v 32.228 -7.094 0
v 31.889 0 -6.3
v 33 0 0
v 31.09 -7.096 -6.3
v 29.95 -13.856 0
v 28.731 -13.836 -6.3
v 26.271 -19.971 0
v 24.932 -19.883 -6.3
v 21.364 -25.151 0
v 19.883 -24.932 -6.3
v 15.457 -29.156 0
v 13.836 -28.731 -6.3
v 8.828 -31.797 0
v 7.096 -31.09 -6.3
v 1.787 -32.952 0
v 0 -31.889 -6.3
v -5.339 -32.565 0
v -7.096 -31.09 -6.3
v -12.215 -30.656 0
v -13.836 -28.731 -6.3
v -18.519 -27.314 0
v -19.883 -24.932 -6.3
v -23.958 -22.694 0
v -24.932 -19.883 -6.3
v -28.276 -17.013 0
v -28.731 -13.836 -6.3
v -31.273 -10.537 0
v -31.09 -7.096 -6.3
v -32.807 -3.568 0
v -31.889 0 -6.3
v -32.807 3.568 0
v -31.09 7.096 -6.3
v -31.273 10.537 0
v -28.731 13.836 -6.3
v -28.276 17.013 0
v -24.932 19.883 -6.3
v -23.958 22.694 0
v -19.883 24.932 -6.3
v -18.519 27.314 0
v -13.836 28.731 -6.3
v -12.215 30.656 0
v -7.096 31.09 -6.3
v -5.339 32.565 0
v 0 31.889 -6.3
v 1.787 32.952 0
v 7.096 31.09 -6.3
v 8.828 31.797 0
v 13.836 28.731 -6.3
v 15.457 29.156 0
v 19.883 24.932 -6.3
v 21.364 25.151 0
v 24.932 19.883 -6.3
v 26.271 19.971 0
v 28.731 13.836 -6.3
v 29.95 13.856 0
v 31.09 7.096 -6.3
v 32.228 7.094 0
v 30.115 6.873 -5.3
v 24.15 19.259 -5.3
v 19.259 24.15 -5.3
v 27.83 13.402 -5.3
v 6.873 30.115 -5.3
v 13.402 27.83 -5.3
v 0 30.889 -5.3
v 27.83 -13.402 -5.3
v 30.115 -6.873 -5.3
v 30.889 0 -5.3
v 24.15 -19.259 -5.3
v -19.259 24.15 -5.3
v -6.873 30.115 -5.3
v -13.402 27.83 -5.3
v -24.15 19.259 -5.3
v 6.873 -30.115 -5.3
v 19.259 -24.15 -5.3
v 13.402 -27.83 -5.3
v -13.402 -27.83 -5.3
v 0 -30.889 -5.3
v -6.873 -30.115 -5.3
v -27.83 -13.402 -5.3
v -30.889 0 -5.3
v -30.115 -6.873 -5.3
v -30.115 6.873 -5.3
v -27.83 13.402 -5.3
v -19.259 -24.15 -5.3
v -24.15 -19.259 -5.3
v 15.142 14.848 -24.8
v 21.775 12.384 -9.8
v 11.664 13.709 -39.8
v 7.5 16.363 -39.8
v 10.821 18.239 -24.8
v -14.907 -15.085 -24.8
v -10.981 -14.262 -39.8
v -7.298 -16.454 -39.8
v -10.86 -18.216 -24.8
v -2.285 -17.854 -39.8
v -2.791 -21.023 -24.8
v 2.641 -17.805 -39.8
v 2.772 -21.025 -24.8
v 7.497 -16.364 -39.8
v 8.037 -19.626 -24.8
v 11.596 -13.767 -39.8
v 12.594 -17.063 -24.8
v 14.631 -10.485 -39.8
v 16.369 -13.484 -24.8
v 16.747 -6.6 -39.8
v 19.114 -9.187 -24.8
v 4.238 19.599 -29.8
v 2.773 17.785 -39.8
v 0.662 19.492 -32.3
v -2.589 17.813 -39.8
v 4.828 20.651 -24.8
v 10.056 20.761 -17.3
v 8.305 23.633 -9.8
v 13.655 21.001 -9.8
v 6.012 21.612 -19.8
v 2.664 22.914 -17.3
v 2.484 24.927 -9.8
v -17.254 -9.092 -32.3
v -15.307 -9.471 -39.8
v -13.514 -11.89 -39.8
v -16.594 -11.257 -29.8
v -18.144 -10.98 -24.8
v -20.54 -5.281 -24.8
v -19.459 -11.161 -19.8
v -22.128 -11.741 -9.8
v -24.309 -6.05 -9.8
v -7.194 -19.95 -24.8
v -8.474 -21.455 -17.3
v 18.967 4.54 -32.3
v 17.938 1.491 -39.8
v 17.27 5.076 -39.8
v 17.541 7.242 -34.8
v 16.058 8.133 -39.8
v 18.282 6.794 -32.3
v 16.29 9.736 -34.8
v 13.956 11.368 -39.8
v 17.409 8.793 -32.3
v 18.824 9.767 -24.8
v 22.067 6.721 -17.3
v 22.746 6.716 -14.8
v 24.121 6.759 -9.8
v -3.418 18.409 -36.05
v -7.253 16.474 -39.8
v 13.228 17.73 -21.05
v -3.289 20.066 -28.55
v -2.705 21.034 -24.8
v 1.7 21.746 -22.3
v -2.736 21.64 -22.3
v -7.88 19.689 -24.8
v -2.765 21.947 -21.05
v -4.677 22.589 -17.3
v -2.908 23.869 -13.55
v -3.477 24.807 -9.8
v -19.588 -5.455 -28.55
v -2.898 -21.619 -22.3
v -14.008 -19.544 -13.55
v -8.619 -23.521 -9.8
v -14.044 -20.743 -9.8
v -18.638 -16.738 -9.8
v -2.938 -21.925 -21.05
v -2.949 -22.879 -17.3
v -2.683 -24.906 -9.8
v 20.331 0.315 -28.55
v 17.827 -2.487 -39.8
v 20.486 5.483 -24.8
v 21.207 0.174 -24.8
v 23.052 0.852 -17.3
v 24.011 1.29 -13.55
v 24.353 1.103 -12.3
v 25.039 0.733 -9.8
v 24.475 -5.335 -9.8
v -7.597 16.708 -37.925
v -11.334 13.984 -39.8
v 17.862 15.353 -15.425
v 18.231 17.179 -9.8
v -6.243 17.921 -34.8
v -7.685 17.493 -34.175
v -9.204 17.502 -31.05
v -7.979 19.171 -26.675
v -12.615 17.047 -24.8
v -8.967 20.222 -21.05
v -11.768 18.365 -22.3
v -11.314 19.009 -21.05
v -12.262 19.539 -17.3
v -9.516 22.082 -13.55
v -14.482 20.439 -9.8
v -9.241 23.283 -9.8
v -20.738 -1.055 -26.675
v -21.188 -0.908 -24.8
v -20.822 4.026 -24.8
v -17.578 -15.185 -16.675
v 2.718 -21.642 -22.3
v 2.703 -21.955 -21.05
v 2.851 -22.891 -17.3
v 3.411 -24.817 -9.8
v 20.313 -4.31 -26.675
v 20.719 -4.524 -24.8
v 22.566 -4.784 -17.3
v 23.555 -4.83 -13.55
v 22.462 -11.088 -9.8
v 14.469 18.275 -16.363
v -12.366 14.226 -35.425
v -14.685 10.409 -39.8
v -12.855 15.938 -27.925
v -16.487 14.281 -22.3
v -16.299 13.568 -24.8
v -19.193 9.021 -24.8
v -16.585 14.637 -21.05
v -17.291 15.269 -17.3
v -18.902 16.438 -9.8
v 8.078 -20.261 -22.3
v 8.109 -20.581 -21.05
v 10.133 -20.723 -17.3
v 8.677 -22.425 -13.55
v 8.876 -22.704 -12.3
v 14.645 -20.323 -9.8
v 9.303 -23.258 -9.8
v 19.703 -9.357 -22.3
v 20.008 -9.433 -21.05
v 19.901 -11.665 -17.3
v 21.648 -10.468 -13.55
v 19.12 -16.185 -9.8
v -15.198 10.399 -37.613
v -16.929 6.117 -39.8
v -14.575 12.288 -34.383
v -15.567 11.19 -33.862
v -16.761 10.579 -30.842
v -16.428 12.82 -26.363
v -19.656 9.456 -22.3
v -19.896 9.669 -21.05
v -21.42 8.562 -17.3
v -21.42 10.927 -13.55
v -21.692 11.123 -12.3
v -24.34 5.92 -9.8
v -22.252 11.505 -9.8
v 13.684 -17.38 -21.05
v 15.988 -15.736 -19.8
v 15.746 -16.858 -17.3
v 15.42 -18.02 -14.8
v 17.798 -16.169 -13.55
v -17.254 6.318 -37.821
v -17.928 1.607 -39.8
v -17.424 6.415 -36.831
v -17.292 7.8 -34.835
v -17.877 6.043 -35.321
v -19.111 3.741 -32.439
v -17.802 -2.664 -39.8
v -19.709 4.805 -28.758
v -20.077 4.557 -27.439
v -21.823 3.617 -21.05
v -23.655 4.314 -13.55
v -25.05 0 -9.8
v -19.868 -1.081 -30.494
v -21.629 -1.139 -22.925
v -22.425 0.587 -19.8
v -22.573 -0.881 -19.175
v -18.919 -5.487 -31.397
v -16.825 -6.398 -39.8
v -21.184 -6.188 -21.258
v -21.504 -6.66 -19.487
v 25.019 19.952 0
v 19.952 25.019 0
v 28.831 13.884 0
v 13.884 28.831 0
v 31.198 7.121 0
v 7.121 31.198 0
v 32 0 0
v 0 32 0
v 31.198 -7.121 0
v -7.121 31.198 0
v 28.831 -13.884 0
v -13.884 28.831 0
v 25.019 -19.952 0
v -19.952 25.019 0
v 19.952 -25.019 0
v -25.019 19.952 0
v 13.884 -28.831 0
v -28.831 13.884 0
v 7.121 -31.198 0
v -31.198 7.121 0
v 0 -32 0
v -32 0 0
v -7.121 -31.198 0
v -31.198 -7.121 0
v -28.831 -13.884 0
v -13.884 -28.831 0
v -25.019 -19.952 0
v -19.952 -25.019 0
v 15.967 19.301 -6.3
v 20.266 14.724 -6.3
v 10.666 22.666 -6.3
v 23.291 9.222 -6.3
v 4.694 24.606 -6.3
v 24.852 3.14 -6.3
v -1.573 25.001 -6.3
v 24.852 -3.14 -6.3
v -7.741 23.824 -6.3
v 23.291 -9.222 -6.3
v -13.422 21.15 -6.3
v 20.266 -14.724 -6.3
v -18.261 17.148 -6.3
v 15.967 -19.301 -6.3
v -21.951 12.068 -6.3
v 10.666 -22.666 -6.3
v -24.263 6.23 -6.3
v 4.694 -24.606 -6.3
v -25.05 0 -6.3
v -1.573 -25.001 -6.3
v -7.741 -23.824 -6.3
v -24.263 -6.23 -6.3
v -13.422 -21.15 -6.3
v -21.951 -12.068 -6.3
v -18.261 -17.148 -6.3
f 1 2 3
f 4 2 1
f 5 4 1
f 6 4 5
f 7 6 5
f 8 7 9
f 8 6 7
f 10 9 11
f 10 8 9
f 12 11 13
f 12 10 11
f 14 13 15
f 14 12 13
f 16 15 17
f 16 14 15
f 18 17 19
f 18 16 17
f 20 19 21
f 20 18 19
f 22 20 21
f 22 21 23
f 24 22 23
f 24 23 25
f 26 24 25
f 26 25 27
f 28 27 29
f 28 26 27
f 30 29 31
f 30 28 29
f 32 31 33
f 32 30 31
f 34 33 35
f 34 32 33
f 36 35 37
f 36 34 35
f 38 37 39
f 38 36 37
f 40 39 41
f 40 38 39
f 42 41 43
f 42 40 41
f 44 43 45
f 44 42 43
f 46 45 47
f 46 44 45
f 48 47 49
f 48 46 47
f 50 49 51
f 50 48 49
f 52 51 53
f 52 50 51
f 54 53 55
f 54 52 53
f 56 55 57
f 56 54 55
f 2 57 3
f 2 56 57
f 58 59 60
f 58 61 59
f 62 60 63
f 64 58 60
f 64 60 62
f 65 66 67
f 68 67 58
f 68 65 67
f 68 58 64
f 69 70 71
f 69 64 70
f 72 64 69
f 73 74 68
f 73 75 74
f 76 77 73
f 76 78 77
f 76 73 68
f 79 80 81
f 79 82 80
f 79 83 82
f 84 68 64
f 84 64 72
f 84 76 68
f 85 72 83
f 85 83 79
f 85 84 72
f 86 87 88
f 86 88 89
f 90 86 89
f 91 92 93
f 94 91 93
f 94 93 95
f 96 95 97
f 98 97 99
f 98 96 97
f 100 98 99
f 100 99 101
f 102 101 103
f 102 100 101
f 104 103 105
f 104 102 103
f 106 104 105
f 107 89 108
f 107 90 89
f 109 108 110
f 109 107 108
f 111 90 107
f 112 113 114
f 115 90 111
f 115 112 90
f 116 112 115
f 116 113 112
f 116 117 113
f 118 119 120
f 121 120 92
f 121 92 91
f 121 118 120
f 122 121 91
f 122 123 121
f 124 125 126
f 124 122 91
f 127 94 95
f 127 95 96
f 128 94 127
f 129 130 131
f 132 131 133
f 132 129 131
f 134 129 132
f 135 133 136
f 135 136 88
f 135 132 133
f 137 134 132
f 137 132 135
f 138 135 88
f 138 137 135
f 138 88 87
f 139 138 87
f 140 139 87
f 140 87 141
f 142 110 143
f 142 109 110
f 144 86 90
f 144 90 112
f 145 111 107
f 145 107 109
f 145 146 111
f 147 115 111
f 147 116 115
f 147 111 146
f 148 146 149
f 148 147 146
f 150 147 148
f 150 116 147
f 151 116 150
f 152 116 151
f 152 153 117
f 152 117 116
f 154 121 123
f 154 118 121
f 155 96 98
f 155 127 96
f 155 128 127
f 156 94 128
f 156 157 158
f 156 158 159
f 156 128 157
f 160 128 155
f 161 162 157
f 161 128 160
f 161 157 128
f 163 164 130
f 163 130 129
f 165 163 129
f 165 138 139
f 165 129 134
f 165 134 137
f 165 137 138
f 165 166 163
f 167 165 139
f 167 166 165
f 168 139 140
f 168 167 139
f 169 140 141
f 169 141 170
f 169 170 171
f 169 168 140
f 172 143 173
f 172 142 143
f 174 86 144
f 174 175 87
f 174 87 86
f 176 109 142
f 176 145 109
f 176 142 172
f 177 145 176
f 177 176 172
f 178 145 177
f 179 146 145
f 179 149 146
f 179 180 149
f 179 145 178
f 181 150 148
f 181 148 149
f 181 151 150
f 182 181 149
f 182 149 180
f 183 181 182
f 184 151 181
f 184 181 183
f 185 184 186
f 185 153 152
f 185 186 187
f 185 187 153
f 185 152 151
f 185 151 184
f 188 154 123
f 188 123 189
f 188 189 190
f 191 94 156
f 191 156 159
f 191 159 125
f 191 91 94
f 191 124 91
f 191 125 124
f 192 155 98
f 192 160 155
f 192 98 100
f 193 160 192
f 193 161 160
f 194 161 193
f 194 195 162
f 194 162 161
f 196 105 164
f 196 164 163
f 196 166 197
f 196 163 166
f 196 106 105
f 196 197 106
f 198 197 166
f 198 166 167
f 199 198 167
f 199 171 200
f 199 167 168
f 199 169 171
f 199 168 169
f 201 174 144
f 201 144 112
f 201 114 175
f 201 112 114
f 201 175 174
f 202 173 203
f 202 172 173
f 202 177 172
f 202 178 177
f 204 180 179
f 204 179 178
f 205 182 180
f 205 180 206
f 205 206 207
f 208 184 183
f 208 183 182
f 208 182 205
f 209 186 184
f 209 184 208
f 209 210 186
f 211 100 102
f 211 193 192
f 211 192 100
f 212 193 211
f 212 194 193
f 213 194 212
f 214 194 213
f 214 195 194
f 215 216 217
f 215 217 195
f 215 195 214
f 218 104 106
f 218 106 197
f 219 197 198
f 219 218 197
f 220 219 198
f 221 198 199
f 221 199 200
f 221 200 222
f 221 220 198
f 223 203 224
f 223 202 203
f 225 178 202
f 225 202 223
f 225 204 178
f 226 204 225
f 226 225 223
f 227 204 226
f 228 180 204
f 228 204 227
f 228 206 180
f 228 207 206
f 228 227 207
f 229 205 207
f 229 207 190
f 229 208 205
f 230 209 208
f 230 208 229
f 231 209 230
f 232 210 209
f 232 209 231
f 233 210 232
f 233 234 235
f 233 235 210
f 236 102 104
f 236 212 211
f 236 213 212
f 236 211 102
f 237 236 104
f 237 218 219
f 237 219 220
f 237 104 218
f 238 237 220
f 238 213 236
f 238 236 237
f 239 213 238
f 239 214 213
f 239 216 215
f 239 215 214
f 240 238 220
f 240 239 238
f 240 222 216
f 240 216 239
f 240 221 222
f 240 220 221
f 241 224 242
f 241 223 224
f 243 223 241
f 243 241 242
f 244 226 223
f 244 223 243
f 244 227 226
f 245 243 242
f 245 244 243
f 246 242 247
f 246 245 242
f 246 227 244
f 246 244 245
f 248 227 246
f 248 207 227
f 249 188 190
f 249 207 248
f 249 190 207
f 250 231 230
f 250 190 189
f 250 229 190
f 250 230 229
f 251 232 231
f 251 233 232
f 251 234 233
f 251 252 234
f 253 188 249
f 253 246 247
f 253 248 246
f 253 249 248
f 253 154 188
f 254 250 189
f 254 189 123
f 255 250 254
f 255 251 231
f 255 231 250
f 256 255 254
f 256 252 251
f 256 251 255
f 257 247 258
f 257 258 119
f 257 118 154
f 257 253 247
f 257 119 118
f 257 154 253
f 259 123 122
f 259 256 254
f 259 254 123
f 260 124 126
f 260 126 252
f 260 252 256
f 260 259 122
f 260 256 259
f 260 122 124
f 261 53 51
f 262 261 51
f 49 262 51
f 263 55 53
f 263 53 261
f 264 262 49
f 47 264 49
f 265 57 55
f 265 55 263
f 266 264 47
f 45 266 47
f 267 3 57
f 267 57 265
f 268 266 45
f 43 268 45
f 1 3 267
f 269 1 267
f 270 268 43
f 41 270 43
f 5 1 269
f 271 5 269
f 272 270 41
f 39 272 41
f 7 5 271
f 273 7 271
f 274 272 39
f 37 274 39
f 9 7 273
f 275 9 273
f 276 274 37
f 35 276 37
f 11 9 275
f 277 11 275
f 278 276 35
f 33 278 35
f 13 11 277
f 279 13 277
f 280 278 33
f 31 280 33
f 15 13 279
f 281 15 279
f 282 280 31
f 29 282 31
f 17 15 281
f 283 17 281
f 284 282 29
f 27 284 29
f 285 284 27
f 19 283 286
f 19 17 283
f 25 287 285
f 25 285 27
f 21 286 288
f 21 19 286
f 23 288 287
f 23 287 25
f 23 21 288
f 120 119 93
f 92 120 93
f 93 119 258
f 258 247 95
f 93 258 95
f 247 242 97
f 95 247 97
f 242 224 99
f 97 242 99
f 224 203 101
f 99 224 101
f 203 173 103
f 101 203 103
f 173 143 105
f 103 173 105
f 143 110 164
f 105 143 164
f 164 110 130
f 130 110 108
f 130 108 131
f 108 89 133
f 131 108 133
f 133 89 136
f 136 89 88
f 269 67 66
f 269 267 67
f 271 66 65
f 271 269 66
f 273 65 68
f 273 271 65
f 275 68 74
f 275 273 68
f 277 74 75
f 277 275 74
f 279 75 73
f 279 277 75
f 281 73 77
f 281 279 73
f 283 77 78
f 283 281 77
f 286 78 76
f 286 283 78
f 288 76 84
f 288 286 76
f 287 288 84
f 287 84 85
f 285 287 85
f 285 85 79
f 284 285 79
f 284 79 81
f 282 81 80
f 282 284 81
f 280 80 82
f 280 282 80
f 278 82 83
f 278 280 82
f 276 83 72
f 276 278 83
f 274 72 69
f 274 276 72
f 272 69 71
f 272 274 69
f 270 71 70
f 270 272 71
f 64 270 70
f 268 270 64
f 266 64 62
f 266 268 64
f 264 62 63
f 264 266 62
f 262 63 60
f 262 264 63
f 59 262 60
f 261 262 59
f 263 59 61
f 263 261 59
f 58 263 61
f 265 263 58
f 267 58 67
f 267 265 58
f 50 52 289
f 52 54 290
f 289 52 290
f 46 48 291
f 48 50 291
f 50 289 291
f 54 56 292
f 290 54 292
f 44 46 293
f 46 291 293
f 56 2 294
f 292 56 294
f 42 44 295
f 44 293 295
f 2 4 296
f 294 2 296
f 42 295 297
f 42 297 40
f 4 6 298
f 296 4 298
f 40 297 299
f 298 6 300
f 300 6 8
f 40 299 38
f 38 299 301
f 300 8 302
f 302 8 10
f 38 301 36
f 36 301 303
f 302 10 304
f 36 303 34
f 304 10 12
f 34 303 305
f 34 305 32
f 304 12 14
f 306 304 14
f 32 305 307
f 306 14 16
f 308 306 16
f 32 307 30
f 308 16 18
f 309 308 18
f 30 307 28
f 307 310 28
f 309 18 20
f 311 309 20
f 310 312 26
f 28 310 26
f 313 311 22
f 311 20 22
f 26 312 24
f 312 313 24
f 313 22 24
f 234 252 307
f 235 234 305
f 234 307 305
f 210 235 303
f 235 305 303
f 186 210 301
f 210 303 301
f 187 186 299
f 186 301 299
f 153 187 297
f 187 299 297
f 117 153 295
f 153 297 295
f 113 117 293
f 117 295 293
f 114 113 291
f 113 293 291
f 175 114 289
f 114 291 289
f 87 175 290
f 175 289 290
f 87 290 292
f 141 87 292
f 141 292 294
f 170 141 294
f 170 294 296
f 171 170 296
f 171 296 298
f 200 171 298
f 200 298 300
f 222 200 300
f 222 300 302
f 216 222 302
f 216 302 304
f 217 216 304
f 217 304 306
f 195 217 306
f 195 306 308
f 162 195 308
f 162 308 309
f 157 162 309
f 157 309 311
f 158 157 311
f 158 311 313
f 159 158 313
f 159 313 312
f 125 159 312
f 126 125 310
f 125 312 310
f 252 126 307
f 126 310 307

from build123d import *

# Parameters (mm, degrees)
IZIM3_R                     = 25.05
Y_KSEKLIK_EKSTR_ZYON1_DEPTH = 3.5


with BuildPart() as part:
    # Çizim2 → Döndür1 (revolve)
    with BuildSketch(Plane(origin=(0, 0, 0), x_dir=(1, 0, 0), z_dir=(0, 1, 0)), mode=Mode.PRIVATE) as d_nd_r1_sk:
        Polygon((-33, 0), (-31.889140022, 6.3), (-30.889140022, 6.3), (0, 6.3), (0, 5.3), (-30.889140022, 5.3), (-32, 0), align=None)
    revolve(d_nd_r1_sk.sketch.rotate(Axis((0, 0, 0), (0, 0, -1)), 180), axis=Axis((0, 0, 0), (0, 0, -1)))

    # Çizim3 → Yükseklik-Ekstrüzyon1 (add)
    with BuildSketch(Plane(origin=(0, 0, -6.3), x_dir=(-1, 0, 0), z_dir=(0, 0, -1))):
        Circle(IZIM3_R)
    extrude(amount=Y_KSEKLIK_EKSTR_ZYON1_DEPTH)

    # Loft1: read off the stored shape, not the designer's step
    # Loft1: loft between two sections, ruled curve by curve
    loft1_from = [
        Edge.make_bspline([(11.664244151, 13.709318305, -39.8), (-15.754392459, 37.037806607, -39.8), (-39.082880761, 9.619169997, -39.8), (-11.664244151, -13.709318305, -39.8), (15.754392459, -37.037806607, -39.8), (39.082880761, -9.619169997, -39.8), (11.664244151, 13.709318305, -39.8)], [0, 0, 0, 0, 0.5, 0.5, 0.5, 1, 1, 1, 1], 3, [1, 0.333333333, 0.333333333, 1, 0.333333333, 0.333333333, 1]),
    ]
    loft1_to = [
        Edge.make_bspline([(21.774798676, 12.38388641, -9.8), (-2.992974145, 55.933483762, -9.8), (-46.542571497, 31.165710941, -9.8), (-21.774798676, -12.38388641, -9.8), (2.992974145, -55.933483762, -9.8), (46.542571497, -31.165710941, -9.8), (21.774798676, 12.38388641, -9.8)], [0, 0, 0, 0, 0.5, 0.5, 0.5, 1, 1, 1, 1], 3, [1, 0.333333333, 0.333333333, 1, 0.333333333, 0.333333333, 1]),
    ]
    loft1 = Solid(Shell([*[Face.make_surface_from_curves(loft1_from[k], loft1_to[k]) for k in range(1)], Face(Wire(loft1_from)), Face(Wire(loft1_to))]))
    add(loft1)


solid = part.part
